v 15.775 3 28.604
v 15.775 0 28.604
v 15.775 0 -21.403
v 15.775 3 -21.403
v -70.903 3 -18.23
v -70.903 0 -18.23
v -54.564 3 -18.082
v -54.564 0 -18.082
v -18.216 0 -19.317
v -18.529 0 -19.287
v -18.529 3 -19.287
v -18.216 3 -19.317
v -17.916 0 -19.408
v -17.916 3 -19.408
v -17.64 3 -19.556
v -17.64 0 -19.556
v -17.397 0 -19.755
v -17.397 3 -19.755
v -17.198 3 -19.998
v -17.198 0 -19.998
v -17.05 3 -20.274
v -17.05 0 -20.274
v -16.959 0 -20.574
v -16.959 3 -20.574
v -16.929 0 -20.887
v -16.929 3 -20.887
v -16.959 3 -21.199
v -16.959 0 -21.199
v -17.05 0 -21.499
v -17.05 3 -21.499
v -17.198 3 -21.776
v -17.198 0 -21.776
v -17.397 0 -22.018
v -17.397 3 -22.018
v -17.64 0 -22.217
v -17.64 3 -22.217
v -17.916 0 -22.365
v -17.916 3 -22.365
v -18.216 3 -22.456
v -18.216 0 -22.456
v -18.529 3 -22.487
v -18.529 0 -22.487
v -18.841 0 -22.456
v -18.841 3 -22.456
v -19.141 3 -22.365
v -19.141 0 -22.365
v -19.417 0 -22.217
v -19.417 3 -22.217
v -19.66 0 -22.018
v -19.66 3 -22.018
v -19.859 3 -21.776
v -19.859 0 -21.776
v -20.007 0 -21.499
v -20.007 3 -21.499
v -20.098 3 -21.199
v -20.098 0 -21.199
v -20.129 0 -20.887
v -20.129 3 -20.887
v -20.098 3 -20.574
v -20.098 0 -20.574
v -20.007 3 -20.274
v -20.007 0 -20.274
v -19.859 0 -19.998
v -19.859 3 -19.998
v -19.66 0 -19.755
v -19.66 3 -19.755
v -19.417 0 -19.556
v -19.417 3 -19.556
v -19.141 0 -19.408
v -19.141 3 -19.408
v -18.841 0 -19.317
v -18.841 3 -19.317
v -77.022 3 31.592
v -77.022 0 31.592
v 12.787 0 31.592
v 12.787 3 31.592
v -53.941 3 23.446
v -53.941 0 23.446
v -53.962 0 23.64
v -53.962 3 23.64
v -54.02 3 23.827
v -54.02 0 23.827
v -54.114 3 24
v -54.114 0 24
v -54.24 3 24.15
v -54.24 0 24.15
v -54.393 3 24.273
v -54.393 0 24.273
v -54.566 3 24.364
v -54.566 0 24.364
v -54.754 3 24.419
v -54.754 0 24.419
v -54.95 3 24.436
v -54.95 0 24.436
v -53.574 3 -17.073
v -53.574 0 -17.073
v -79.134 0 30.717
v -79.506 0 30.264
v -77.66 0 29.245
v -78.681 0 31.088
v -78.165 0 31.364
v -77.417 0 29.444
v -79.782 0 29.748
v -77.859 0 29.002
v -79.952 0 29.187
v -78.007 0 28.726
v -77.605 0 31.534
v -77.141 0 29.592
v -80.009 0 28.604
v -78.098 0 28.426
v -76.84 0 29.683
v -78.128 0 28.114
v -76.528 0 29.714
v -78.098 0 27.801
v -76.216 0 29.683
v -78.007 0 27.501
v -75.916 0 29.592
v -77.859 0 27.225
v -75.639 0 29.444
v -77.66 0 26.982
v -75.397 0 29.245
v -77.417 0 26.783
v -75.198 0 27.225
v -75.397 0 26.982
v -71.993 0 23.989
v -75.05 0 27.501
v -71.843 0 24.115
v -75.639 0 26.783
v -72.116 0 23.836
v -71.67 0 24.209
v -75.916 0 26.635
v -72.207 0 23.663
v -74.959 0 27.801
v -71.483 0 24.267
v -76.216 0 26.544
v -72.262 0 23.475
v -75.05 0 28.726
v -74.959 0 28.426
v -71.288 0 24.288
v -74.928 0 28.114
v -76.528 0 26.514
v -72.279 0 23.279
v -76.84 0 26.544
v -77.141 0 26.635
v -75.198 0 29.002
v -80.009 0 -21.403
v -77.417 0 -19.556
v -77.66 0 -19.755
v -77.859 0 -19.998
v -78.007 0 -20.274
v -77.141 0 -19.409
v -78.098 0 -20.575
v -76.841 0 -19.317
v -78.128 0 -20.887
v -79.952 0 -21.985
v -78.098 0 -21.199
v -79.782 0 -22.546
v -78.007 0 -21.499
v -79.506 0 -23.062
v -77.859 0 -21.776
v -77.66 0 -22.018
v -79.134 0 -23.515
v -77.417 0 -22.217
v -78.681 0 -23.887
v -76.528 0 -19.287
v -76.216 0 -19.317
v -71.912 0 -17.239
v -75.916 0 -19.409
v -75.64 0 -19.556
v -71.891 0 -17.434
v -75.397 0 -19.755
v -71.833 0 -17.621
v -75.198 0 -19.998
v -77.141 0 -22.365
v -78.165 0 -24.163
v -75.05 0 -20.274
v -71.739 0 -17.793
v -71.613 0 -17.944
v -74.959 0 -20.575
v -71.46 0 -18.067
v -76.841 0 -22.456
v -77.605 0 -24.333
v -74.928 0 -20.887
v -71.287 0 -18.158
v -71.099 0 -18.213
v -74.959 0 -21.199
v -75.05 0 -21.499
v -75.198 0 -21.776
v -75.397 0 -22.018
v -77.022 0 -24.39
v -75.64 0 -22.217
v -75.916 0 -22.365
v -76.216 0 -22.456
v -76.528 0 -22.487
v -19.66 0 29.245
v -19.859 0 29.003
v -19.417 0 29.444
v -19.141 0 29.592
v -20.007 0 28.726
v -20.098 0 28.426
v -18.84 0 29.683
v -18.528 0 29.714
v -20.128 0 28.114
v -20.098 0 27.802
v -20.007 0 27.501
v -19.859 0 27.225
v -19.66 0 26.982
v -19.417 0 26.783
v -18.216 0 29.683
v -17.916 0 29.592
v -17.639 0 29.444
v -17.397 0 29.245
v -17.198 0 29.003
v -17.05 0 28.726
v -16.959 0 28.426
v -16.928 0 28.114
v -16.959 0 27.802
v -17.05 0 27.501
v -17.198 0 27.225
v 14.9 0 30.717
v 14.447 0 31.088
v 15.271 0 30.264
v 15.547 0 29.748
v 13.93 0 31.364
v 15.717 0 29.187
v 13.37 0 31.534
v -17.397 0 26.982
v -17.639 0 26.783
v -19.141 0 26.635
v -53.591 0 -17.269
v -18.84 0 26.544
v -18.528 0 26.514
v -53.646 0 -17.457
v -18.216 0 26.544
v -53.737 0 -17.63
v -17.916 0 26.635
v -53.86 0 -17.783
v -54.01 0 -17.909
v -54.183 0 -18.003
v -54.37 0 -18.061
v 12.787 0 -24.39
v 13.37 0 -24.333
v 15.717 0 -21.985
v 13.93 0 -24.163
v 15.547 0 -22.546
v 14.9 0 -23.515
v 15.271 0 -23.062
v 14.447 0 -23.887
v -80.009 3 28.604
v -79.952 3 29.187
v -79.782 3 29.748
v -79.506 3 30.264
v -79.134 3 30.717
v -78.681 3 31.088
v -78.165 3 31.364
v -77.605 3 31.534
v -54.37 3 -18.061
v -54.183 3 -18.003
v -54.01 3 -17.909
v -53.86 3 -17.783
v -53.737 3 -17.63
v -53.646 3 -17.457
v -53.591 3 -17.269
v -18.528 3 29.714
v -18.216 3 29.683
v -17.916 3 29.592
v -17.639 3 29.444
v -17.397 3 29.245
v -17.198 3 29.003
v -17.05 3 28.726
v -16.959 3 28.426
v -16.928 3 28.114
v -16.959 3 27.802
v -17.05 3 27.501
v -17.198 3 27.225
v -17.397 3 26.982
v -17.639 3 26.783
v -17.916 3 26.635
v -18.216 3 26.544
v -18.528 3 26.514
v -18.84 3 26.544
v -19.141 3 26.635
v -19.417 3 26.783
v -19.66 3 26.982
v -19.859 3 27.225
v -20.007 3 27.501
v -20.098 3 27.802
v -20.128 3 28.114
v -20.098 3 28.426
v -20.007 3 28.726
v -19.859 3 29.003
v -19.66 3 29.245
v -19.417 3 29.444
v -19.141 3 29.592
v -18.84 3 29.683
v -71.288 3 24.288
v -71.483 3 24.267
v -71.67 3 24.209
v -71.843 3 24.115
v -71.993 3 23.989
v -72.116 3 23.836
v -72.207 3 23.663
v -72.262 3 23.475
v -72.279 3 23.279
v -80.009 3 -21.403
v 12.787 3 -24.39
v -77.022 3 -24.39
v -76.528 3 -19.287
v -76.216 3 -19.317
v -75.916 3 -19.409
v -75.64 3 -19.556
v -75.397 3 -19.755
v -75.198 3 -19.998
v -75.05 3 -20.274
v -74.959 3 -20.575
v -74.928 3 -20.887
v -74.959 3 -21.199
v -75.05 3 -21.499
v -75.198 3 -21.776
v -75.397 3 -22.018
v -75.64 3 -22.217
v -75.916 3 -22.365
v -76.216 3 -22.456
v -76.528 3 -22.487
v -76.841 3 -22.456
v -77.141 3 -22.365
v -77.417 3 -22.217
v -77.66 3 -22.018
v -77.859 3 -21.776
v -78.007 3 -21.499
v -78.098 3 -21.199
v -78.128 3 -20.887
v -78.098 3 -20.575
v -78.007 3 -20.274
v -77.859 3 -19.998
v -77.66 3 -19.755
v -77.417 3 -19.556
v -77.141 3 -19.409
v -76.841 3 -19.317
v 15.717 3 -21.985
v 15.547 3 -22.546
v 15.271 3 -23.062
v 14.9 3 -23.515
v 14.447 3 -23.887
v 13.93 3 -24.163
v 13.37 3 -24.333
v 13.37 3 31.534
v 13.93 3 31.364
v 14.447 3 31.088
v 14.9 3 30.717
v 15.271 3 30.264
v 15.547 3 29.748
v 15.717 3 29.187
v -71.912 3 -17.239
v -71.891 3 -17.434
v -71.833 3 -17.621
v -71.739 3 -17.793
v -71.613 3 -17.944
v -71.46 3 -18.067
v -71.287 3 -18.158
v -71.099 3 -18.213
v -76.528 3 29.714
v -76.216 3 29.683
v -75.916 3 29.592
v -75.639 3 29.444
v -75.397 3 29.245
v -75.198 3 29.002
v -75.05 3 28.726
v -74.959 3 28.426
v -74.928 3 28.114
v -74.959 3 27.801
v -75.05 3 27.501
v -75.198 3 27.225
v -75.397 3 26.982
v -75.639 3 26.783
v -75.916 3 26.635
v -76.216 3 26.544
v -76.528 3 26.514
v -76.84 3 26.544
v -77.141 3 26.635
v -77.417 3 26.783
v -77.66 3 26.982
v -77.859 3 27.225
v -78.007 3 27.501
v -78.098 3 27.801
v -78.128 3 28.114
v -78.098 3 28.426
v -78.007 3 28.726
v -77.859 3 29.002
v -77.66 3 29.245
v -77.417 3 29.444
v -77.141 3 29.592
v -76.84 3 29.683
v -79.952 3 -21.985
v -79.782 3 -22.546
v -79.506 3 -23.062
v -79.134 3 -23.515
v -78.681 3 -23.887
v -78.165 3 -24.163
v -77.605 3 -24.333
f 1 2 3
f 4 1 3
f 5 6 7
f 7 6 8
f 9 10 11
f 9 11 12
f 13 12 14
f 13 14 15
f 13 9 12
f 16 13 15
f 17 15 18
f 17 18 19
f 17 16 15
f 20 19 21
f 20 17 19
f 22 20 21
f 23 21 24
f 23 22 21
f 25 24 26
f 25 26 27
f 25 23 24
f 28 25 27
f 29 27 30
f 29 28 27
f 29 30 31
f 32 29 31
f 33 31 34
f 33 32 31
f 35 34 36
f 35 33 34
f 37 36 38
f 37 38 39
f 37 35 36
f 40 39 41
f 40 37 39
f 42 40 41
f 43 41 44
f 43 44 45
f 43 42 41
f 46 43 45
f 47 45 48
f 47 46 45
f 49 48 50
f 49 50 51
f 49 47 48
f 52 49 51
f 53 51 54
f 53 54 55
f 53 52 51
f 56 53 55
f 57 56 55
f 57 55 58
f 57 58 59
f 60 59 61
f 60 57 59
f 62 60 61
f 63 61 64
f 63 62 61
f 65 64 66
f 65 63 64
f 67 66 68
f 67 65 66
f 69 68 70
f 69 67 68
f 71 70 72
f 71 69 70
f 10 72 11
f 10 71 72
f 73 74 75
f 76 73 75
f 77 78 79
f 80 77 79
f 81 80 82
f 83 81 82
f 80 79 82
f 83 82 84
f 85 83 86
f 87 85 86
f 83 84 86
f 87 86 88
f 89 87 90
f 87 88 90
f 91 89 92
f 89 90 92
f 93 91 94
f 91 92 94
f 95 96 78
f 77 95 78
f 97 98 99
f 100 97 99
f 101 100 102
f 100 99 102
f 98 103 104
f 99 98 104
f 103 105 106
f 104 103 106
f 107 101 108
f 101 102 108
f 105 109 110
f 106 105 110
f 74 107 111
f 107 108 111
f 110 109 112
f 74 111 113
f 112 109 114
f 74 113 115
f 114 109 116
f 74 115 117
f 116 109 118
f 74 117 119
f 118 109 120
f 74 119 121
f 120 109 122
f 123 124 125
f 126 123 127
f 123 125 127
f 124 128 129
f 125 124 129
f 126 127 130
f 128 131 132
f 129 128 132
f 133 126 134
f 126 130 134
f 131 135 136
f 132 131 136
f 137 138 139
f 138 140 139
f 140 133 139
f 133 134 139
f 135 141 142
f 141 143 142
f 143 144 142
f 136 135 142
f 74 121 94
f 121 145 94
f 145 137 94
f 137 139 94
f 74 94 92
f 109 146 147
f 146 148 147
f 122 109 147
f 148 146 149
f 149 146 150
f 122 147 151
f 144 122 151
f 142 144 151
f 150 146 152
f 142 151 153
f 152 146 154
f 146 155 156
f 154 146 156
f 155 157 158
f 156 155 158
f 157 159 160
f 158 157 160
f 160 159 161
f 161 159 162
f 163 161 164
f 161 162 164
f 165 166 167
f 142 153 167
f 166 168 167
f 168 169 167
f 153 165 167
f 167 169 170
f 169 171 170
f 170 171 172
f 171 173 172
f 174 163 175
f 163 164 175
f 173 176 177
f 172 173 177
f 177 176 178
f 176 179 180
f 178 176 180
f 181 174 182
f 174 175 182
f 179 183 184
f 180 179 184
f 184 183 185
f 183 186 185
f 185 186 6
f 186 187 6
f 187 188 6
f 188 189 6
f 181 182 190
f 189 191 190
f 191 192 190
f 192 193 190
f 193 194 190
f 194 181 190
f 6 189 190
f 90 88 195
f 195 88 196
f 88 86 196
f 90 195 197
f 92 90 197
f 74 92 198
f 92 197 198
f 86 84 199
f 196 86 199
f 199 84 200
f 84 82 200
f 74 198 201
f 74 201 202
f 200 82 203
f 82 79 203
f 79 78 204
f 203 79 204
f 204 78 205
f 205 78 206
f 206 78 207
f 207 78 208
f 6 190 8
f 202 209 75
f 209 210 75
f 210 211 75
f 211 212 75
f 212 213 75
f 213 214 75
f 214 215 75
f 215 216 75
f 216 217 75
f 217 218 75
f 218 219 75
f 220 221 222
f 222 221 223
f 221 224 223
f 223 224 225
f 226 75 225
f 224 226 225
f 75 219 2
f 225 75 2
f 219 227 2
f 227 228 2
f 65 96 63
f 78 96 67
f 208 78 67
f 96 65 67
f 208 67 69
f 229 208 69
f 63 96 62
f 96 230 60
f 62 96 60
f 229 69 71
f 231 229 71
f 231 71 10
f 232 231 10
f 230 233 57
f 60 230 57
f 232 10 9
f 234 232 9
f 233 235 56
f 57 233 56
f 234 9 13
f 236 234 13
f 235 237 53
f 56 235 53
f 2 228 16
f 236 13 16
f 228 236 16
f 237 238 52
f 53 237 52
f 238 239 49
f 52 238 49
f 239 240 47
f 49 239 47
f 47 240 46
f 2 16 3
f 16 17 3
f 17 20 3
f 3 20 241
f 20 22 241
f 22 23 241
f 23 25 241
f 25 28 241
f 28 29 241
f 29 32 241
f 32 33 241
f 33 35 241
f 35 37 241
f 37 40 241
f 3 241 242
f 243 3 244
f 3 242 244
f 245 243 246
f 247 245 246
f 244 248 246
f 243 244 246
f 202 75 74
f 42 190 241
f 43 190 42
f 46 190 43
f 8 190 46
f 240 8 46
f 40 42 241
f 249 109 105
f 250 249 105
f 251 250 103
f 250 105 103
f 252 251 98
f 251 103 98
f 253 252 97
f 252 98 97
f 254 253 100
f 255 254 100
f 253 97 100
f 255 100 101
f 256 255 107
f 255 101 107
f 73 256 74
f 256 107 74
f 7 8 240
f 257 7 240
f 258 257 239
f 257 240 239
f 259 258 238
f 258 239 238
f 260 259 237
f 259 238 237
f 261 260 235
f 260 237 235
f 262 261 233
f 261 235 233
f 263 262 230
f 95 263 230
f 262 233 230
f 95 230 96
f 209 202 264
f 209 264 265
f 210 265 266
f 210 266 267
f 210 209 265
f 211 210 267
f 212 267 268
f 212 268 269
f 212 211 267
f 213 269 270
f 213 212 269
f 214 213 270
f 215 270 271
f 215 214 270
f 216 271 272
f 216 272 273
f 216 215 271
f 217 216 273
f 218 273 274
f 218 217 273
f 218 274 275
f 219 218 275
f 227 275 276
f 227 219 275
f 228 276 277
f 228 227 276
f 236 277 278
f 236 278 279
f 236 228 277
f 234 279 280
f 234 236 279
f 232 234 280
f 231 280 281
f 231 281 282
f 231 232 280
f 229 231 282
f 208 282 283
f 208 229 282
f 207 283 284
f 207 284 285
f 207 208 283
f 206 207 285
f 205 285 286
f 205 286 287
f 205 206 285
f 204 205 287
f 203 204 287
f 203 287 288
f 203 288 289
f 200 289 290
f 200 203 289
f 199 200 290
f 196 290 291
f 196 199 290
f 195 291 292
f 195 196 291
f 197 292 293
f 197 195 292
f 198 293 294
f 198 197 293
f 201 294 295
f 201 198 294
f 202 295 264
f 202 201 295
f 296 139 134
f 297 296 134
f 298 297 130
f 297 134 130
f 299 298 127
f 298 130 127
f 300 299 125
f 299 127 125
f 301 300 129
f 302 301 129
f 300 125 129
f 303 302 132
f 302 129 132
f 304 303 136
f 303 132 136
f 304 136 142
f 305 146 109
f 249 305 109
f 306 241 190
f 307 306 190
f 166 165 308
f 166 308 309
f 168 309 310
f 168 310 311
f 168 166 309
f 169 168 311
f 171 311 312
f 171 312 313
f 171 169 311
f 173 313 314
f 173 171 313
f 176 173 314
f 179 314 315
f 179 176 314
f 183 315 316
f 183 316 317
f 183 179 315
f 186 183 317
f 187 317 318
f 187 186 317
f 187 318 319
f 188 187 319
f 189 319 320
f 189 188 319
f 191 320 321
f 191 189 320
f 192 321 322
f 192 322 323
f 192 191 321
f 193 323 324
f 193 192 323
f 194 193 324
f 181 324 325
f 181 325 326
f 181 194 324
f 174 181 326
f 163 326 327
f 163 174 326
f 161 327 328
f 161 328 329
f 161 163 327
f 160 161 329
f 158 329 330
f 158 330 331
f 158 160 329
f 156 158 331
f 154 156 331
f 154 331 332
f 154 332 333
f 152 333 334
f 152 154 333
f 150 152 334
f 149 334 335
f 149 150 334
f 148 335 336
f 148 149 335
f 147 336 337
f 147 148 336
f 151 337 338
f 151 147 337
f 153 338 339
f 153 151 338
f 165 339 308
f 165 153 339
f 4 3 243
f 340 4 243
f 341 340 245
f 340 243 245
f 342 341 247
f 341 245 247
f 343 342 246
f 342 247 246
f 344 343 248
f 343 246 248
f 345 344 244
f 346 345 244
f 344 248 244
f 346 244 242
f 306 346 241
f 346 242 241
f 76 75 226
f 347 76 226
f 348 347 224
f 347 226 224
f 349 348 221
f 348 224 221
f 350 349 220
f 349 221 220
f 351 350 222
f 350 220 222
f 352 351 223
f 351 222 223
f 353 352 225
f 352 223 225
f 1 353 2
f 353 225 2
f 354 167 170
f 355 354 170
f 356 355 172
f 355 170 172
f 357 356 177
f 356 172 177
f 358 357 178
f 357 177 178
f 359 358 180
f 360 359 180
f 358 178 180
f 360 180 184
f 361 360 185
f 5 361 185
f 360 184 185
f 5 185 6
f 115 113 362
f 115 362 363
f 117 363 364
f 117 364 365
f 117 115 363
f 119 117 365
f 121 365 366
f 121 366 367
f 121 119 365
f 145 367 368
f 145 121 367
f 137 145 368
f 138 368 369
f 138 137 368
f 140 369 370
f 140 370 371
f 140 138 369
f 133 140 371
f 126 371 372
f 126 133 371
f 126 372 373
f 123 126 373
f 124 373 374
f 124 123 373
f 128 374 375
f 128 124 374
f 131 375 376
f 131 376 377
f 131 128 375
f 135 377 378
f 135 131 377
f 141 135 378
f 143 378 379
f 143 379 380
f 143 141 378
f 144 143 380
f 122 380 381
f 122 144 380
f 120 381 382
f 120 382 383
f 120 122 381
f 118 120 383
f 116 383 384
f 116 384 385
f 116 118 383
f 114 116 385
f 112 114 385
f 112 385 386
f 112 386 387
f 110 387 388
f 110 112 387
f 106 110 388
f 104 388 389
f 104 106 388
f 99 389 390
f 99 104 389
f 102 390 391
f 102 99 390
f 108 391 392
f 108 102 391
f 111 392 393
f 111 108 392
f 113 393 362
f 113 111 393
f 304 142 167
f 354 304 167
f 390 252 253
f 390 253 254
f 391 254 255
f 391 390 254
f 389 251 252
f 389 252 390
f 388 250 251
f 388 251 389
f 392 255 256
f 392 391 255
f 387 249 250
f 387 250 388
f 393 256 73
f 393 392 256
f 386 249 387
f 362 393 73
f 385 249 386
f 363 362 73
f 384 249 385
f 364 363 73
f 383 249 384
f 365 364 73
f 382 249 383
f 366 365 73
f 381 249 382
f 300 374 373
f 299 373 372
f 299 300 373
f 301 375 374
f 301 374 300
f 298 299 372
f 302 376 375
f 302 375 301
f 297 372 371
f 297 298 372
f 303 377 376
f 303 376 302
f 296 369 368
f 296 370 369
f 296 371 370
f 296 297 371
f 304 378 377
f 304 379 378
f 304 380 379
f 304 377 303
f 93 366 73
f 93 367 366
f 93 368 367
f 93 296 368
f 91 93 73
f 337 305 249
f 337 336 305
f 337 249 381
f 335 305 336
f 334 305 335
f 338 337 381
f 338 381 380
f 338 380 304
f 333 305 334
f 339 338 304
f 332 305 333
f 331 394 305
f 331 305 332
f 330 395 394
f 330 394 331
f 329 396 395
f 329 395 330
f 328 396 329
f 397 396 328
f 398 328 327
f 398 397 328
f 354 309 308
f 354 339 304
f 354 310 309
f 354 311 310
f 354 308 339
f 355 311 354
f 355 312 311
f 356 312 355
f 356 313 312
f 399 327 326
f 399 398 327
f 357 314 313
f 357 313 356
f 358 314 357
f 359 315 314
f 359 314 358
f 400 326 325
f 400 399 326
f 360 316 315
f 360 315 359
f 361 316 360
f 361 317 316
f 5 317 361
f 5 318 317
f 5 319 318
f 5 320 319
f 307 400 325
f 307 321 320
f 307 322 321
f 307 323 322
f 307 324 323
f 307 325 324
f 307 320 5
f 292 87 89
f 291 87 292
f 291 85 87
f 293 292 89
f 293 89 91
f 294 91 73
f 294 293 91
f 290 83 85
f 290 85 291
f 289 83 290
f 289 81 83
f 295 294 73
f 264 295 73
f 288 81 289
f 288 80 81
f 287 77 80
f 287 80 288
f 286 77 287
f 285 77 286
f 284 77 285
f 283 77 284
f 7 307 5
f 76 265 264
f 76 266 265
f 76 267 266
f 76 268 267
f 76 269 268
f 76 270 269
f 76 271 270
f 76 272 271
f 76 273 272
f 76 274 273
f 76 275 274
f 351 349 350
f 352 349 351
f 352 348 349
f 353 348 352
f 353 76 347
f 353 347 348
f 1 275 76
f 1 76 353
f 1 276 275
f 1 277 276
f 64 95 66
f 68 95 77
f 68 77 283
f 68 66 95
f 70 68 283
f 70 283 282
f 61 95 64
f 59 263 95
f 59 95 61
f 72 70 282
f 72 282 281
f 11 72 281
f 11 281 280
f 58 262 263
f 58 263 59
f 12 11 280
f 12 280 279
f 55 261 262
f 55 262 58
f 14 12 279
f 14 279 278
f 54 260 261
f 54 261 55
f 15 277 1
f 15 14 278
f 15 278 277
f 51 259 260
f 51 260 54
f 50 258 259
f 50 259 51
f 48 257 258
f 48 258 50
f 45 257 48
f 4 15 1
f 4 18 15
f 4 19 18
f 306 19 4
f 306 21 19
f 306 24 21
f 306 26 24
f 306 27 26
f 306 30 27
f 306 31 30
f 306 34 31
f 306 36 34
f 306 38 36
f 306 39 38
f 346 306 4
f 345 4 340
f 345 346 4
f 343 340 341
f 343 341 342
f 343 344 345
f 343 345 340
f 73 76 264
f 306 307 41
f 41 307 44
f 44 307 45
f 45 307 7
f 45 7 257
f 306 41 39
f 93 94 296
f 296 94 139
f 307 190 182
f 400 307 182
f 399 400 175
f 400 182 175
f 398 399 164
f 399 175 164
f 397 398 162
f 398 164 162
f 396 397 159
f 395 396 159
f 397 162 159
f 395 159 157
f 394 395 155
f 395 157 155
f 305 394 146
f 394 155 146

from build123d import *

# Parameters (mm, degrees)
SKETCH_1_R      = 1.6
EXTRUDE_1_DEPTH = 3


with BuildPart() as part:
    # 草图1 → 凸台-拉伸1 (new body)
    with BuildSketch(Plane(origin=(0, 0, 0), x_dir=(1, 0, 0), z_dir=(0, 1, 0))):
        with BuildLine():
            Line((-80.009028181, 21.402670377), (-80.009028181, -28.604431477))
            ThreePointArc((-80.009028181, -28.604431477), (-79.134066788, -30.716775138), (-77.021723127, -31.591736531))
            Line((-77.021723127, -31.591736531), (12.787258331, -31.591736531))
            ThreePointArc((12.787258331, -31.591736531), (14.899601993, -30.716775138), (15.774563386, -28.604431477))
            Line((15.774563386, -28.604431477), (15.774563386, 21.402670377))
            ThreePointArc((15.774563386, 21.402670377), (14.899601993, 23.515014039), (12.787258331, 24.389975432))
            Line((12.787258331, 24.389975432), (-77.021723127, 24.389975432))
            ThreePointArc((-77.021723127, 24.389975432), (-79.134066788, 23.515014039), (-80.009028181, 21.402670377))
        make_face()
        with Locations(Location((-76.52848462, 20.886724226, 0), (0, 0, 270))):
            Circle(SKETCH_1_R, mode=Mode.SUBTRACT)
        with Locations(Location((-18.52858622, 20.886597225, 0), (0, 0, 270))):
            Circle(SKETCH_1_R, mode=Mode.SUBTRACT)
        with Locations(Location((-18.52833222, -28.113656775, 0), (0, 0, 270))):
            Circle(SKETCH_1_R, mode=Mode.SUBTRACT)
        with Locations(Location((-76.52833222, -28.113529775, 0), (0, 0, 270))):
            Circle(SKETCH_1_R, mode=Mode.SUBTRACT)
        with BuildLine():
            Line((-70.903401709, 18.230282987), (-54.564490165, 18.082300473))
            ThreePointArc((-54.564490165, 18.082300473), (-53.860065027, 17.78301522), (-53.573587867, 17.073284796))
            Line((-53.573587867, 17.073284796), (-53.940568984, -23.445502526))
            ThreePointArc((-53.940568984, -23.445502526), (-54.239854236, -24.149927664), (-54.94958466, -24.436404824))
            Line((-54.94958466, -24.436404824), (-71.288496204, -24.288422311))
            ThreePointArc((-71.288496204, -24.288422311), (-71.992921342, -23.989137058), (-72.279398502, -23.279406634))
            Line((-72.279398502, -23.279406634), (-71.912417386, 17.239380688))
            ThreePointArc((-71.912417386, 17.239380688), (-71.613132133, 17.943805826), (-70.903401709, 18.230282987))
        make_face(mode=Mode.SUBTRACT)
    extrude(amount=EXTRUDE_1_DEPTH)


solid = part.part
